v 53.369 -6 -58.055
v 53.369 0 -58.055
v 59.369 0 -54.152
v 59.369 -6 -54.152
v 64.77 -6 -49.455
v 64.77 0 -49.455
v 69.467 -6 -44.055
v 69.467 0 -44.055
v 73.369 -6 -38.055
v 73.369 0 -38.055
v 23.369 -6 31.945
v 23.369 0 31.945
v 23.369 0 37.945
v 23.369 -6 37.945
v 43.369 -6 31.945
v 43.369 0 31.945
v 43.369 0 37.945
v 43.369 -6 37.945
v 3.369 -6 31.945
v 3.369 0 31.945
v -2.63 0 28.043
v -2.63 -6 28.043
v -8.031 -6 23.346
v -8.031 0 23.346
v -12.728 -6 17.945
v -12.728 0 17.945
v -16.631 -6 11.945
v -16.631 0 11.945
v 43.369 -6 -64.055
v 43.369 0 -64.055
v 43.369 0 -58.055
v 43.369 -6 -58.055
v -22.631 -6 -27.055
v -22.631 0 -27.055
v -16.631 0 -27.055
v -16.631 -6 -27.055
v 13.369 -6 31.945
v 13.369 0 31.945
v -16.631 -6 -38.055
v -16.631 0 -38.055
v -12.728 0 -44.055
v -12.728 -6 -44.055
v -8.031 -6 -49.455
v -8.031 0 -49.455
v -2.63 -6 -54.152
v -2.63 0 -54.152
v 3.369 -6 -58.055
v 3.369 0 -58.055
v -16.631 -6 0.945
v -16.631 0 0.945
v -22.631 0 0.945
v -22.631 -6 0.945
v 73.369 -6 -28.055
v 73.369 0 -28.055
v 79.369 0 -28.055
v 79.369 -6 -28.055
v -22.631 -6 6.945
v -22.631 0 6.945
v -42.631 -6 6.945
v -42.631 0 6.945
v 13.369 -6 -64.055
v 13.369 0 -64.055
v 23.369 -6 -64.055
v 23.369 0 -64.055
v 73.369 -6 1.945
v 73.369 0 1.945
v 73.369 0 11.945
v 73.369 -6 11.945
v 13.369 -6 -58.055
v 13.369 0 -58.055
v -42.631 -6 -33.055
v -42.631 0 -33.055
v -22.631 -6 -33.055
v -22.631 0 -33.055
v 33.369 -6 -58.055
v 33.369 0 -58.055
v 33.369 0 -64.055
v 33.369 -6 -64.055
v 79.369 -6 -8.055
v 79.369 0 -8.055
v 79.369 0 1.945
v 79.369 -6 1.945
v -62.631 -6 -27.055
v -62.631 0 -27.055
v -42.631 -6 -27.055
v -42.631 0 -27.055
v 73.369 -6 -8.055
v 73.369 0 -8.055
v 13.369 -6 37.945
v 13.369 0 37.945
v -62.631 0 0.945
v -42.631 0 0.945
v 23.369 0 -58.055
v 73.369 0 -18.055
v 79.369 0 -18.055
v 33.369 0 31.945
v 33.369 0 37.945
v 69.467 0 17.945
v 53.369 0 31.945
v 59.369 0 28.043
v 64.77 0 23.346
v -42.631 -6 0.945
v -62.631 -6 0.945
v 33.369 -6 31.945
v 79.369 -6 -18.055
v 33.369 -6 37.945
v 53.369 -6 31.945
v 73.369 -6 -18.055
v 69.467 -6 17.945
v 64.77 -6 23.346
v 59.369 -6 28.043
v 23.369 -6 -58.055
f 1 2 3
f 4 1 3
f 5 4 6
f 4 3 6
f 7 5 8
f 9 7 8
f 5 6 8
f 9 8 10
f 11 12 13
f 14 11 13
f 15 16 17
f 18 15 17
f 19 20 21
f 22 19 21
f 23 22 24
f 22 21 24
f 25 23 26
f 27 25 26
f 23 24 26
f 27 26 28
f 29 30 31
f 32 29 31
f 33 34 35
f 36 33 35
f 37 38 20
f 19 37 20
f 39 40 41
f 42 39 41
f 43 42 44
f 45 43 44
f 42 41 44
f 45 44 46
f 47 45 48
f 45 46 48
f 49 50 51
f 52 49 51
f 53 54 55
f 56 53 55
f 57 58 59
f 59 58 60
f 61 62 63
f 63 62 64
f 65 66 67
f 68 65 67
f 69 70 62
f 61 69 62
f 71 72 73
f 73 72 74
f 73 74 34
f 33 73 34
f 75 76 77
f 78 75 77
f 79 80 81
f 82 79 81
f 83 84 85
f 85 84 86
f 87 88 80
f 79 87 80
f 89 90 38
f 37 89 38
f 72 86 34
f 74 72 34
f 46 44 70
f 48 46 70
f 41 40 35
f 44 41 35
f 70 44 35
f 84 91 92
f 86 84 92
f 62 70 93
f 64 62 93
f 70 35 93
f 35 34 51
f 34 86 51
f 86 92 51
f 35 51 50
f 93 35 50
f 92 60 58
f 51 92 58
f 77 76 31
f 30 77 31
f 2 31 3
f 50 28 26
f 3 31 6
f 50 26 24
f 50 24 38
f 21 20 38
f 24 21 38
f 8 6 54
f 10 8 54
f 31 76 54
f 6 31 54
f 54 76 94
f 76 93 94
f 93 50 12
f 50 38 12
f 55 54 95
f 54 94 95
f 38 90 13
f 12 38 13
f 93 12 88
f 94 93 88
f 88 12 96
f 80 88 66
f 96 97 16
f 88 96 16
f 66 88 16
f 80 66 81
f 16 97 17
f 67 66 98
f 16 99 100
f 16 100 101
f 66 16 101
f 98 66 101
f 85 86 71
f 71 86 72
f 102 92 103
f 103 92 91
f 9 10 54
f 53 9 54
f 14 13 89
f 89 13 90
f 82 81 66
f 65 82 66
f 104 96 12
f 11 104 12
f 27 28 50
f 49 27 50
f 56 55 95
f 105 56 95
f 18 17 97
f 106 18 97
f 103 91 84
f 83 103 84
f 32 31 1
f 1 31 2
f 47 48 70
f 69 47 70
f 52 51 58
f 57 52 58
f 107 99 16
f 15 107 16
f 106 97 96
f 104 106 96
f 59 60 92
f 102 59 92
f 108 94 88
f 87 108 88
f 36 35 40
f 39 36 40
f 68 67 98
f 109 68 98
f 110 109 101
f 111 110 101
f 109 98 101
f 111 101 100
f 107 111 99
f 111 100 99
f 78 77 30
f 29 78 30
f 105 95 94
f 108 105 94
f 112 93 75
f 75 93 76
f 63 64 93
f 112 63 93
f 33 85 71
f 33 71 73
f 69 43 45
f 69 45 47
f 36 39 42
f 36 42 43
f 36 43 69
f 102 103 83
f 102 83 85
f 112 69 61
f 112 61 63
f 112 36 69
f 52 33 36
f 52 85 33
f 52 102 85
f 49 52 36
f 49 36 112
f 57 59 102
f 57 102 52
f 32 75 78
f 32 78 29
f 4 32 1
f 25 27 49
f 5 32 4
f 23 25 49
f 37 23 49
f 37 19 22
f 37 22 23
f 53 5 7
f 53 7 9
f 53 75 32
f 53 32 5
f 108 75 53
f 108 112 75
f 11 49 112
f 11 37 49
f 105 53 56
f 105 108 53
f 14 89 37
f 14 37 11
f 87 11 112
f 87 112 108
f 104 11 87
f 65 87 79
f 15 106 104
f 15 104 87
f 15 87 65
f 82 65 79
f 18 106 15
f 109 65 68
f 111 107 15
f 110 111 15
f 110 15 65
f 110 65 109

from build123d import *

# Parameters (mm, degrees)
F1_DEPTH = 6


with BuildPart() as f1:
    # F0 (on Front) → F1 (new body)
    with BuildSketch(Plane.XZ):
        with BuildLine():
            Line((43.369441, -58.054813), (53.369441, -58.054813))
            ThreePointArc((53.369441, -58.054813), (64.76999, -49.455363), (73.369441, -38.054813))
            Line((73.369441, -38.054813), (73.369441, -28.054813))
            Line((73.369441, -28.054813), (79.369441, -28.054813))
            Line((79.369441, -28.054813), (79.369441, -18.054813))
            Line((79.369441, -18.054813), (73.369441, -18.054813))
            Line((73.369441, -18.054813), (73.369441, -8.054813))
            Line((73.369441, -8.054813), (79.369441, -8.054813))
            Line((79.369441, -8.054813), (79.369441, 1.945187))
            Line((79.369441, 1.945187), (73.369441, 1.945187))
            Line((73.369441, 1.945187), (73.369441, 11.945187))
            ThreePointArc((73.369441, 11.945187), (64.76999, 23.345736), (53.369441, 31.945187))
            Line((53.369441, 31.945187), (43.369441, 31.945187))
            Line((43.369441, 31.945187), (43.369441, 37.945187))
            Line((43.369441, 37.945187), (33.369441, 37.945187))
            Line((33.369441, 37.945187), (33.369441, 31.945187))
            Line((33.369441, 31.945187), (23.369441, 31.945187))
            Line((23.369441, 31.945187), (23.369441, 37.945187))
            Line((23.369441, 37.945187), (13.369441, 37.945187))
            Line((13.369441, 37.945187), (13.369441, 31.945187))
            Line((13.369441, 31.945187), (3.369441, 31.945187))
            ThreePointArc((3.369441, 31.945187), (-8.031109, 23.345736), (-16.630559, 11.945187))
            Line((-16.630559, 11.945187), (-16.630559, 0.945187))
            Line((-16.630559, 0.945187), (-22.630559, 0.945187))
            Line((-22.630559, 0.945187), (-22.630559, 6.945187))
            Line((-22.630559, 6.945187), (-42.630559, 6.945187))
            Line((-42.630559, 6.945187), (-42.630559, 0.945187))
            Line((-42.630559, 0.945187), (-62.630559, 0.945187))
            Line((-62.630559, 0.945187), (-62.630559, -27.054813))
            Line((-62.630559, -27.054813), (-42.630559, -27.054813))
            Line((-42.630559, -27.054813), (-42.630559, -33.054813))
            Line((-42.630559, -33.054813), (-22.630559, -33.054813))
            Line((-22.630559, -33.054813), (-22.630559, -27.054813))
            Line((-22.630559, -27.054813), (-16.630559, -27.054813))
            Line((-16.630559, -27.054813), (-16.630559, -38.054813))
            ThreePointArc((-16.630559, -38.054813), (-8.031109, -49.455363), (3.369441, -58.054813))
            Line((3.369441, -58.054813), (13.369441, -58.054813))
            Line((13.369441, -58.054813), (13.369441, -64.054813))
            Line((13.369441, -64.054813), (23.369441, -64.054813))
            Line((23.369441, -64.054813), (23.369441, -58.054813))
            Line((23.369441, -58.054813), (33.369441, -58.054813))
            Line((33.369441, -58.054813), (33.369441, -64.054813))
            Line((33.369441, -64.054813), (43.369441, -64.054813))
            Line((43.369441, -64.054813), (43.369441, -58.054813))
        make_face()
    extrude(amount=F1_DEPTH)


solid = f1.part
